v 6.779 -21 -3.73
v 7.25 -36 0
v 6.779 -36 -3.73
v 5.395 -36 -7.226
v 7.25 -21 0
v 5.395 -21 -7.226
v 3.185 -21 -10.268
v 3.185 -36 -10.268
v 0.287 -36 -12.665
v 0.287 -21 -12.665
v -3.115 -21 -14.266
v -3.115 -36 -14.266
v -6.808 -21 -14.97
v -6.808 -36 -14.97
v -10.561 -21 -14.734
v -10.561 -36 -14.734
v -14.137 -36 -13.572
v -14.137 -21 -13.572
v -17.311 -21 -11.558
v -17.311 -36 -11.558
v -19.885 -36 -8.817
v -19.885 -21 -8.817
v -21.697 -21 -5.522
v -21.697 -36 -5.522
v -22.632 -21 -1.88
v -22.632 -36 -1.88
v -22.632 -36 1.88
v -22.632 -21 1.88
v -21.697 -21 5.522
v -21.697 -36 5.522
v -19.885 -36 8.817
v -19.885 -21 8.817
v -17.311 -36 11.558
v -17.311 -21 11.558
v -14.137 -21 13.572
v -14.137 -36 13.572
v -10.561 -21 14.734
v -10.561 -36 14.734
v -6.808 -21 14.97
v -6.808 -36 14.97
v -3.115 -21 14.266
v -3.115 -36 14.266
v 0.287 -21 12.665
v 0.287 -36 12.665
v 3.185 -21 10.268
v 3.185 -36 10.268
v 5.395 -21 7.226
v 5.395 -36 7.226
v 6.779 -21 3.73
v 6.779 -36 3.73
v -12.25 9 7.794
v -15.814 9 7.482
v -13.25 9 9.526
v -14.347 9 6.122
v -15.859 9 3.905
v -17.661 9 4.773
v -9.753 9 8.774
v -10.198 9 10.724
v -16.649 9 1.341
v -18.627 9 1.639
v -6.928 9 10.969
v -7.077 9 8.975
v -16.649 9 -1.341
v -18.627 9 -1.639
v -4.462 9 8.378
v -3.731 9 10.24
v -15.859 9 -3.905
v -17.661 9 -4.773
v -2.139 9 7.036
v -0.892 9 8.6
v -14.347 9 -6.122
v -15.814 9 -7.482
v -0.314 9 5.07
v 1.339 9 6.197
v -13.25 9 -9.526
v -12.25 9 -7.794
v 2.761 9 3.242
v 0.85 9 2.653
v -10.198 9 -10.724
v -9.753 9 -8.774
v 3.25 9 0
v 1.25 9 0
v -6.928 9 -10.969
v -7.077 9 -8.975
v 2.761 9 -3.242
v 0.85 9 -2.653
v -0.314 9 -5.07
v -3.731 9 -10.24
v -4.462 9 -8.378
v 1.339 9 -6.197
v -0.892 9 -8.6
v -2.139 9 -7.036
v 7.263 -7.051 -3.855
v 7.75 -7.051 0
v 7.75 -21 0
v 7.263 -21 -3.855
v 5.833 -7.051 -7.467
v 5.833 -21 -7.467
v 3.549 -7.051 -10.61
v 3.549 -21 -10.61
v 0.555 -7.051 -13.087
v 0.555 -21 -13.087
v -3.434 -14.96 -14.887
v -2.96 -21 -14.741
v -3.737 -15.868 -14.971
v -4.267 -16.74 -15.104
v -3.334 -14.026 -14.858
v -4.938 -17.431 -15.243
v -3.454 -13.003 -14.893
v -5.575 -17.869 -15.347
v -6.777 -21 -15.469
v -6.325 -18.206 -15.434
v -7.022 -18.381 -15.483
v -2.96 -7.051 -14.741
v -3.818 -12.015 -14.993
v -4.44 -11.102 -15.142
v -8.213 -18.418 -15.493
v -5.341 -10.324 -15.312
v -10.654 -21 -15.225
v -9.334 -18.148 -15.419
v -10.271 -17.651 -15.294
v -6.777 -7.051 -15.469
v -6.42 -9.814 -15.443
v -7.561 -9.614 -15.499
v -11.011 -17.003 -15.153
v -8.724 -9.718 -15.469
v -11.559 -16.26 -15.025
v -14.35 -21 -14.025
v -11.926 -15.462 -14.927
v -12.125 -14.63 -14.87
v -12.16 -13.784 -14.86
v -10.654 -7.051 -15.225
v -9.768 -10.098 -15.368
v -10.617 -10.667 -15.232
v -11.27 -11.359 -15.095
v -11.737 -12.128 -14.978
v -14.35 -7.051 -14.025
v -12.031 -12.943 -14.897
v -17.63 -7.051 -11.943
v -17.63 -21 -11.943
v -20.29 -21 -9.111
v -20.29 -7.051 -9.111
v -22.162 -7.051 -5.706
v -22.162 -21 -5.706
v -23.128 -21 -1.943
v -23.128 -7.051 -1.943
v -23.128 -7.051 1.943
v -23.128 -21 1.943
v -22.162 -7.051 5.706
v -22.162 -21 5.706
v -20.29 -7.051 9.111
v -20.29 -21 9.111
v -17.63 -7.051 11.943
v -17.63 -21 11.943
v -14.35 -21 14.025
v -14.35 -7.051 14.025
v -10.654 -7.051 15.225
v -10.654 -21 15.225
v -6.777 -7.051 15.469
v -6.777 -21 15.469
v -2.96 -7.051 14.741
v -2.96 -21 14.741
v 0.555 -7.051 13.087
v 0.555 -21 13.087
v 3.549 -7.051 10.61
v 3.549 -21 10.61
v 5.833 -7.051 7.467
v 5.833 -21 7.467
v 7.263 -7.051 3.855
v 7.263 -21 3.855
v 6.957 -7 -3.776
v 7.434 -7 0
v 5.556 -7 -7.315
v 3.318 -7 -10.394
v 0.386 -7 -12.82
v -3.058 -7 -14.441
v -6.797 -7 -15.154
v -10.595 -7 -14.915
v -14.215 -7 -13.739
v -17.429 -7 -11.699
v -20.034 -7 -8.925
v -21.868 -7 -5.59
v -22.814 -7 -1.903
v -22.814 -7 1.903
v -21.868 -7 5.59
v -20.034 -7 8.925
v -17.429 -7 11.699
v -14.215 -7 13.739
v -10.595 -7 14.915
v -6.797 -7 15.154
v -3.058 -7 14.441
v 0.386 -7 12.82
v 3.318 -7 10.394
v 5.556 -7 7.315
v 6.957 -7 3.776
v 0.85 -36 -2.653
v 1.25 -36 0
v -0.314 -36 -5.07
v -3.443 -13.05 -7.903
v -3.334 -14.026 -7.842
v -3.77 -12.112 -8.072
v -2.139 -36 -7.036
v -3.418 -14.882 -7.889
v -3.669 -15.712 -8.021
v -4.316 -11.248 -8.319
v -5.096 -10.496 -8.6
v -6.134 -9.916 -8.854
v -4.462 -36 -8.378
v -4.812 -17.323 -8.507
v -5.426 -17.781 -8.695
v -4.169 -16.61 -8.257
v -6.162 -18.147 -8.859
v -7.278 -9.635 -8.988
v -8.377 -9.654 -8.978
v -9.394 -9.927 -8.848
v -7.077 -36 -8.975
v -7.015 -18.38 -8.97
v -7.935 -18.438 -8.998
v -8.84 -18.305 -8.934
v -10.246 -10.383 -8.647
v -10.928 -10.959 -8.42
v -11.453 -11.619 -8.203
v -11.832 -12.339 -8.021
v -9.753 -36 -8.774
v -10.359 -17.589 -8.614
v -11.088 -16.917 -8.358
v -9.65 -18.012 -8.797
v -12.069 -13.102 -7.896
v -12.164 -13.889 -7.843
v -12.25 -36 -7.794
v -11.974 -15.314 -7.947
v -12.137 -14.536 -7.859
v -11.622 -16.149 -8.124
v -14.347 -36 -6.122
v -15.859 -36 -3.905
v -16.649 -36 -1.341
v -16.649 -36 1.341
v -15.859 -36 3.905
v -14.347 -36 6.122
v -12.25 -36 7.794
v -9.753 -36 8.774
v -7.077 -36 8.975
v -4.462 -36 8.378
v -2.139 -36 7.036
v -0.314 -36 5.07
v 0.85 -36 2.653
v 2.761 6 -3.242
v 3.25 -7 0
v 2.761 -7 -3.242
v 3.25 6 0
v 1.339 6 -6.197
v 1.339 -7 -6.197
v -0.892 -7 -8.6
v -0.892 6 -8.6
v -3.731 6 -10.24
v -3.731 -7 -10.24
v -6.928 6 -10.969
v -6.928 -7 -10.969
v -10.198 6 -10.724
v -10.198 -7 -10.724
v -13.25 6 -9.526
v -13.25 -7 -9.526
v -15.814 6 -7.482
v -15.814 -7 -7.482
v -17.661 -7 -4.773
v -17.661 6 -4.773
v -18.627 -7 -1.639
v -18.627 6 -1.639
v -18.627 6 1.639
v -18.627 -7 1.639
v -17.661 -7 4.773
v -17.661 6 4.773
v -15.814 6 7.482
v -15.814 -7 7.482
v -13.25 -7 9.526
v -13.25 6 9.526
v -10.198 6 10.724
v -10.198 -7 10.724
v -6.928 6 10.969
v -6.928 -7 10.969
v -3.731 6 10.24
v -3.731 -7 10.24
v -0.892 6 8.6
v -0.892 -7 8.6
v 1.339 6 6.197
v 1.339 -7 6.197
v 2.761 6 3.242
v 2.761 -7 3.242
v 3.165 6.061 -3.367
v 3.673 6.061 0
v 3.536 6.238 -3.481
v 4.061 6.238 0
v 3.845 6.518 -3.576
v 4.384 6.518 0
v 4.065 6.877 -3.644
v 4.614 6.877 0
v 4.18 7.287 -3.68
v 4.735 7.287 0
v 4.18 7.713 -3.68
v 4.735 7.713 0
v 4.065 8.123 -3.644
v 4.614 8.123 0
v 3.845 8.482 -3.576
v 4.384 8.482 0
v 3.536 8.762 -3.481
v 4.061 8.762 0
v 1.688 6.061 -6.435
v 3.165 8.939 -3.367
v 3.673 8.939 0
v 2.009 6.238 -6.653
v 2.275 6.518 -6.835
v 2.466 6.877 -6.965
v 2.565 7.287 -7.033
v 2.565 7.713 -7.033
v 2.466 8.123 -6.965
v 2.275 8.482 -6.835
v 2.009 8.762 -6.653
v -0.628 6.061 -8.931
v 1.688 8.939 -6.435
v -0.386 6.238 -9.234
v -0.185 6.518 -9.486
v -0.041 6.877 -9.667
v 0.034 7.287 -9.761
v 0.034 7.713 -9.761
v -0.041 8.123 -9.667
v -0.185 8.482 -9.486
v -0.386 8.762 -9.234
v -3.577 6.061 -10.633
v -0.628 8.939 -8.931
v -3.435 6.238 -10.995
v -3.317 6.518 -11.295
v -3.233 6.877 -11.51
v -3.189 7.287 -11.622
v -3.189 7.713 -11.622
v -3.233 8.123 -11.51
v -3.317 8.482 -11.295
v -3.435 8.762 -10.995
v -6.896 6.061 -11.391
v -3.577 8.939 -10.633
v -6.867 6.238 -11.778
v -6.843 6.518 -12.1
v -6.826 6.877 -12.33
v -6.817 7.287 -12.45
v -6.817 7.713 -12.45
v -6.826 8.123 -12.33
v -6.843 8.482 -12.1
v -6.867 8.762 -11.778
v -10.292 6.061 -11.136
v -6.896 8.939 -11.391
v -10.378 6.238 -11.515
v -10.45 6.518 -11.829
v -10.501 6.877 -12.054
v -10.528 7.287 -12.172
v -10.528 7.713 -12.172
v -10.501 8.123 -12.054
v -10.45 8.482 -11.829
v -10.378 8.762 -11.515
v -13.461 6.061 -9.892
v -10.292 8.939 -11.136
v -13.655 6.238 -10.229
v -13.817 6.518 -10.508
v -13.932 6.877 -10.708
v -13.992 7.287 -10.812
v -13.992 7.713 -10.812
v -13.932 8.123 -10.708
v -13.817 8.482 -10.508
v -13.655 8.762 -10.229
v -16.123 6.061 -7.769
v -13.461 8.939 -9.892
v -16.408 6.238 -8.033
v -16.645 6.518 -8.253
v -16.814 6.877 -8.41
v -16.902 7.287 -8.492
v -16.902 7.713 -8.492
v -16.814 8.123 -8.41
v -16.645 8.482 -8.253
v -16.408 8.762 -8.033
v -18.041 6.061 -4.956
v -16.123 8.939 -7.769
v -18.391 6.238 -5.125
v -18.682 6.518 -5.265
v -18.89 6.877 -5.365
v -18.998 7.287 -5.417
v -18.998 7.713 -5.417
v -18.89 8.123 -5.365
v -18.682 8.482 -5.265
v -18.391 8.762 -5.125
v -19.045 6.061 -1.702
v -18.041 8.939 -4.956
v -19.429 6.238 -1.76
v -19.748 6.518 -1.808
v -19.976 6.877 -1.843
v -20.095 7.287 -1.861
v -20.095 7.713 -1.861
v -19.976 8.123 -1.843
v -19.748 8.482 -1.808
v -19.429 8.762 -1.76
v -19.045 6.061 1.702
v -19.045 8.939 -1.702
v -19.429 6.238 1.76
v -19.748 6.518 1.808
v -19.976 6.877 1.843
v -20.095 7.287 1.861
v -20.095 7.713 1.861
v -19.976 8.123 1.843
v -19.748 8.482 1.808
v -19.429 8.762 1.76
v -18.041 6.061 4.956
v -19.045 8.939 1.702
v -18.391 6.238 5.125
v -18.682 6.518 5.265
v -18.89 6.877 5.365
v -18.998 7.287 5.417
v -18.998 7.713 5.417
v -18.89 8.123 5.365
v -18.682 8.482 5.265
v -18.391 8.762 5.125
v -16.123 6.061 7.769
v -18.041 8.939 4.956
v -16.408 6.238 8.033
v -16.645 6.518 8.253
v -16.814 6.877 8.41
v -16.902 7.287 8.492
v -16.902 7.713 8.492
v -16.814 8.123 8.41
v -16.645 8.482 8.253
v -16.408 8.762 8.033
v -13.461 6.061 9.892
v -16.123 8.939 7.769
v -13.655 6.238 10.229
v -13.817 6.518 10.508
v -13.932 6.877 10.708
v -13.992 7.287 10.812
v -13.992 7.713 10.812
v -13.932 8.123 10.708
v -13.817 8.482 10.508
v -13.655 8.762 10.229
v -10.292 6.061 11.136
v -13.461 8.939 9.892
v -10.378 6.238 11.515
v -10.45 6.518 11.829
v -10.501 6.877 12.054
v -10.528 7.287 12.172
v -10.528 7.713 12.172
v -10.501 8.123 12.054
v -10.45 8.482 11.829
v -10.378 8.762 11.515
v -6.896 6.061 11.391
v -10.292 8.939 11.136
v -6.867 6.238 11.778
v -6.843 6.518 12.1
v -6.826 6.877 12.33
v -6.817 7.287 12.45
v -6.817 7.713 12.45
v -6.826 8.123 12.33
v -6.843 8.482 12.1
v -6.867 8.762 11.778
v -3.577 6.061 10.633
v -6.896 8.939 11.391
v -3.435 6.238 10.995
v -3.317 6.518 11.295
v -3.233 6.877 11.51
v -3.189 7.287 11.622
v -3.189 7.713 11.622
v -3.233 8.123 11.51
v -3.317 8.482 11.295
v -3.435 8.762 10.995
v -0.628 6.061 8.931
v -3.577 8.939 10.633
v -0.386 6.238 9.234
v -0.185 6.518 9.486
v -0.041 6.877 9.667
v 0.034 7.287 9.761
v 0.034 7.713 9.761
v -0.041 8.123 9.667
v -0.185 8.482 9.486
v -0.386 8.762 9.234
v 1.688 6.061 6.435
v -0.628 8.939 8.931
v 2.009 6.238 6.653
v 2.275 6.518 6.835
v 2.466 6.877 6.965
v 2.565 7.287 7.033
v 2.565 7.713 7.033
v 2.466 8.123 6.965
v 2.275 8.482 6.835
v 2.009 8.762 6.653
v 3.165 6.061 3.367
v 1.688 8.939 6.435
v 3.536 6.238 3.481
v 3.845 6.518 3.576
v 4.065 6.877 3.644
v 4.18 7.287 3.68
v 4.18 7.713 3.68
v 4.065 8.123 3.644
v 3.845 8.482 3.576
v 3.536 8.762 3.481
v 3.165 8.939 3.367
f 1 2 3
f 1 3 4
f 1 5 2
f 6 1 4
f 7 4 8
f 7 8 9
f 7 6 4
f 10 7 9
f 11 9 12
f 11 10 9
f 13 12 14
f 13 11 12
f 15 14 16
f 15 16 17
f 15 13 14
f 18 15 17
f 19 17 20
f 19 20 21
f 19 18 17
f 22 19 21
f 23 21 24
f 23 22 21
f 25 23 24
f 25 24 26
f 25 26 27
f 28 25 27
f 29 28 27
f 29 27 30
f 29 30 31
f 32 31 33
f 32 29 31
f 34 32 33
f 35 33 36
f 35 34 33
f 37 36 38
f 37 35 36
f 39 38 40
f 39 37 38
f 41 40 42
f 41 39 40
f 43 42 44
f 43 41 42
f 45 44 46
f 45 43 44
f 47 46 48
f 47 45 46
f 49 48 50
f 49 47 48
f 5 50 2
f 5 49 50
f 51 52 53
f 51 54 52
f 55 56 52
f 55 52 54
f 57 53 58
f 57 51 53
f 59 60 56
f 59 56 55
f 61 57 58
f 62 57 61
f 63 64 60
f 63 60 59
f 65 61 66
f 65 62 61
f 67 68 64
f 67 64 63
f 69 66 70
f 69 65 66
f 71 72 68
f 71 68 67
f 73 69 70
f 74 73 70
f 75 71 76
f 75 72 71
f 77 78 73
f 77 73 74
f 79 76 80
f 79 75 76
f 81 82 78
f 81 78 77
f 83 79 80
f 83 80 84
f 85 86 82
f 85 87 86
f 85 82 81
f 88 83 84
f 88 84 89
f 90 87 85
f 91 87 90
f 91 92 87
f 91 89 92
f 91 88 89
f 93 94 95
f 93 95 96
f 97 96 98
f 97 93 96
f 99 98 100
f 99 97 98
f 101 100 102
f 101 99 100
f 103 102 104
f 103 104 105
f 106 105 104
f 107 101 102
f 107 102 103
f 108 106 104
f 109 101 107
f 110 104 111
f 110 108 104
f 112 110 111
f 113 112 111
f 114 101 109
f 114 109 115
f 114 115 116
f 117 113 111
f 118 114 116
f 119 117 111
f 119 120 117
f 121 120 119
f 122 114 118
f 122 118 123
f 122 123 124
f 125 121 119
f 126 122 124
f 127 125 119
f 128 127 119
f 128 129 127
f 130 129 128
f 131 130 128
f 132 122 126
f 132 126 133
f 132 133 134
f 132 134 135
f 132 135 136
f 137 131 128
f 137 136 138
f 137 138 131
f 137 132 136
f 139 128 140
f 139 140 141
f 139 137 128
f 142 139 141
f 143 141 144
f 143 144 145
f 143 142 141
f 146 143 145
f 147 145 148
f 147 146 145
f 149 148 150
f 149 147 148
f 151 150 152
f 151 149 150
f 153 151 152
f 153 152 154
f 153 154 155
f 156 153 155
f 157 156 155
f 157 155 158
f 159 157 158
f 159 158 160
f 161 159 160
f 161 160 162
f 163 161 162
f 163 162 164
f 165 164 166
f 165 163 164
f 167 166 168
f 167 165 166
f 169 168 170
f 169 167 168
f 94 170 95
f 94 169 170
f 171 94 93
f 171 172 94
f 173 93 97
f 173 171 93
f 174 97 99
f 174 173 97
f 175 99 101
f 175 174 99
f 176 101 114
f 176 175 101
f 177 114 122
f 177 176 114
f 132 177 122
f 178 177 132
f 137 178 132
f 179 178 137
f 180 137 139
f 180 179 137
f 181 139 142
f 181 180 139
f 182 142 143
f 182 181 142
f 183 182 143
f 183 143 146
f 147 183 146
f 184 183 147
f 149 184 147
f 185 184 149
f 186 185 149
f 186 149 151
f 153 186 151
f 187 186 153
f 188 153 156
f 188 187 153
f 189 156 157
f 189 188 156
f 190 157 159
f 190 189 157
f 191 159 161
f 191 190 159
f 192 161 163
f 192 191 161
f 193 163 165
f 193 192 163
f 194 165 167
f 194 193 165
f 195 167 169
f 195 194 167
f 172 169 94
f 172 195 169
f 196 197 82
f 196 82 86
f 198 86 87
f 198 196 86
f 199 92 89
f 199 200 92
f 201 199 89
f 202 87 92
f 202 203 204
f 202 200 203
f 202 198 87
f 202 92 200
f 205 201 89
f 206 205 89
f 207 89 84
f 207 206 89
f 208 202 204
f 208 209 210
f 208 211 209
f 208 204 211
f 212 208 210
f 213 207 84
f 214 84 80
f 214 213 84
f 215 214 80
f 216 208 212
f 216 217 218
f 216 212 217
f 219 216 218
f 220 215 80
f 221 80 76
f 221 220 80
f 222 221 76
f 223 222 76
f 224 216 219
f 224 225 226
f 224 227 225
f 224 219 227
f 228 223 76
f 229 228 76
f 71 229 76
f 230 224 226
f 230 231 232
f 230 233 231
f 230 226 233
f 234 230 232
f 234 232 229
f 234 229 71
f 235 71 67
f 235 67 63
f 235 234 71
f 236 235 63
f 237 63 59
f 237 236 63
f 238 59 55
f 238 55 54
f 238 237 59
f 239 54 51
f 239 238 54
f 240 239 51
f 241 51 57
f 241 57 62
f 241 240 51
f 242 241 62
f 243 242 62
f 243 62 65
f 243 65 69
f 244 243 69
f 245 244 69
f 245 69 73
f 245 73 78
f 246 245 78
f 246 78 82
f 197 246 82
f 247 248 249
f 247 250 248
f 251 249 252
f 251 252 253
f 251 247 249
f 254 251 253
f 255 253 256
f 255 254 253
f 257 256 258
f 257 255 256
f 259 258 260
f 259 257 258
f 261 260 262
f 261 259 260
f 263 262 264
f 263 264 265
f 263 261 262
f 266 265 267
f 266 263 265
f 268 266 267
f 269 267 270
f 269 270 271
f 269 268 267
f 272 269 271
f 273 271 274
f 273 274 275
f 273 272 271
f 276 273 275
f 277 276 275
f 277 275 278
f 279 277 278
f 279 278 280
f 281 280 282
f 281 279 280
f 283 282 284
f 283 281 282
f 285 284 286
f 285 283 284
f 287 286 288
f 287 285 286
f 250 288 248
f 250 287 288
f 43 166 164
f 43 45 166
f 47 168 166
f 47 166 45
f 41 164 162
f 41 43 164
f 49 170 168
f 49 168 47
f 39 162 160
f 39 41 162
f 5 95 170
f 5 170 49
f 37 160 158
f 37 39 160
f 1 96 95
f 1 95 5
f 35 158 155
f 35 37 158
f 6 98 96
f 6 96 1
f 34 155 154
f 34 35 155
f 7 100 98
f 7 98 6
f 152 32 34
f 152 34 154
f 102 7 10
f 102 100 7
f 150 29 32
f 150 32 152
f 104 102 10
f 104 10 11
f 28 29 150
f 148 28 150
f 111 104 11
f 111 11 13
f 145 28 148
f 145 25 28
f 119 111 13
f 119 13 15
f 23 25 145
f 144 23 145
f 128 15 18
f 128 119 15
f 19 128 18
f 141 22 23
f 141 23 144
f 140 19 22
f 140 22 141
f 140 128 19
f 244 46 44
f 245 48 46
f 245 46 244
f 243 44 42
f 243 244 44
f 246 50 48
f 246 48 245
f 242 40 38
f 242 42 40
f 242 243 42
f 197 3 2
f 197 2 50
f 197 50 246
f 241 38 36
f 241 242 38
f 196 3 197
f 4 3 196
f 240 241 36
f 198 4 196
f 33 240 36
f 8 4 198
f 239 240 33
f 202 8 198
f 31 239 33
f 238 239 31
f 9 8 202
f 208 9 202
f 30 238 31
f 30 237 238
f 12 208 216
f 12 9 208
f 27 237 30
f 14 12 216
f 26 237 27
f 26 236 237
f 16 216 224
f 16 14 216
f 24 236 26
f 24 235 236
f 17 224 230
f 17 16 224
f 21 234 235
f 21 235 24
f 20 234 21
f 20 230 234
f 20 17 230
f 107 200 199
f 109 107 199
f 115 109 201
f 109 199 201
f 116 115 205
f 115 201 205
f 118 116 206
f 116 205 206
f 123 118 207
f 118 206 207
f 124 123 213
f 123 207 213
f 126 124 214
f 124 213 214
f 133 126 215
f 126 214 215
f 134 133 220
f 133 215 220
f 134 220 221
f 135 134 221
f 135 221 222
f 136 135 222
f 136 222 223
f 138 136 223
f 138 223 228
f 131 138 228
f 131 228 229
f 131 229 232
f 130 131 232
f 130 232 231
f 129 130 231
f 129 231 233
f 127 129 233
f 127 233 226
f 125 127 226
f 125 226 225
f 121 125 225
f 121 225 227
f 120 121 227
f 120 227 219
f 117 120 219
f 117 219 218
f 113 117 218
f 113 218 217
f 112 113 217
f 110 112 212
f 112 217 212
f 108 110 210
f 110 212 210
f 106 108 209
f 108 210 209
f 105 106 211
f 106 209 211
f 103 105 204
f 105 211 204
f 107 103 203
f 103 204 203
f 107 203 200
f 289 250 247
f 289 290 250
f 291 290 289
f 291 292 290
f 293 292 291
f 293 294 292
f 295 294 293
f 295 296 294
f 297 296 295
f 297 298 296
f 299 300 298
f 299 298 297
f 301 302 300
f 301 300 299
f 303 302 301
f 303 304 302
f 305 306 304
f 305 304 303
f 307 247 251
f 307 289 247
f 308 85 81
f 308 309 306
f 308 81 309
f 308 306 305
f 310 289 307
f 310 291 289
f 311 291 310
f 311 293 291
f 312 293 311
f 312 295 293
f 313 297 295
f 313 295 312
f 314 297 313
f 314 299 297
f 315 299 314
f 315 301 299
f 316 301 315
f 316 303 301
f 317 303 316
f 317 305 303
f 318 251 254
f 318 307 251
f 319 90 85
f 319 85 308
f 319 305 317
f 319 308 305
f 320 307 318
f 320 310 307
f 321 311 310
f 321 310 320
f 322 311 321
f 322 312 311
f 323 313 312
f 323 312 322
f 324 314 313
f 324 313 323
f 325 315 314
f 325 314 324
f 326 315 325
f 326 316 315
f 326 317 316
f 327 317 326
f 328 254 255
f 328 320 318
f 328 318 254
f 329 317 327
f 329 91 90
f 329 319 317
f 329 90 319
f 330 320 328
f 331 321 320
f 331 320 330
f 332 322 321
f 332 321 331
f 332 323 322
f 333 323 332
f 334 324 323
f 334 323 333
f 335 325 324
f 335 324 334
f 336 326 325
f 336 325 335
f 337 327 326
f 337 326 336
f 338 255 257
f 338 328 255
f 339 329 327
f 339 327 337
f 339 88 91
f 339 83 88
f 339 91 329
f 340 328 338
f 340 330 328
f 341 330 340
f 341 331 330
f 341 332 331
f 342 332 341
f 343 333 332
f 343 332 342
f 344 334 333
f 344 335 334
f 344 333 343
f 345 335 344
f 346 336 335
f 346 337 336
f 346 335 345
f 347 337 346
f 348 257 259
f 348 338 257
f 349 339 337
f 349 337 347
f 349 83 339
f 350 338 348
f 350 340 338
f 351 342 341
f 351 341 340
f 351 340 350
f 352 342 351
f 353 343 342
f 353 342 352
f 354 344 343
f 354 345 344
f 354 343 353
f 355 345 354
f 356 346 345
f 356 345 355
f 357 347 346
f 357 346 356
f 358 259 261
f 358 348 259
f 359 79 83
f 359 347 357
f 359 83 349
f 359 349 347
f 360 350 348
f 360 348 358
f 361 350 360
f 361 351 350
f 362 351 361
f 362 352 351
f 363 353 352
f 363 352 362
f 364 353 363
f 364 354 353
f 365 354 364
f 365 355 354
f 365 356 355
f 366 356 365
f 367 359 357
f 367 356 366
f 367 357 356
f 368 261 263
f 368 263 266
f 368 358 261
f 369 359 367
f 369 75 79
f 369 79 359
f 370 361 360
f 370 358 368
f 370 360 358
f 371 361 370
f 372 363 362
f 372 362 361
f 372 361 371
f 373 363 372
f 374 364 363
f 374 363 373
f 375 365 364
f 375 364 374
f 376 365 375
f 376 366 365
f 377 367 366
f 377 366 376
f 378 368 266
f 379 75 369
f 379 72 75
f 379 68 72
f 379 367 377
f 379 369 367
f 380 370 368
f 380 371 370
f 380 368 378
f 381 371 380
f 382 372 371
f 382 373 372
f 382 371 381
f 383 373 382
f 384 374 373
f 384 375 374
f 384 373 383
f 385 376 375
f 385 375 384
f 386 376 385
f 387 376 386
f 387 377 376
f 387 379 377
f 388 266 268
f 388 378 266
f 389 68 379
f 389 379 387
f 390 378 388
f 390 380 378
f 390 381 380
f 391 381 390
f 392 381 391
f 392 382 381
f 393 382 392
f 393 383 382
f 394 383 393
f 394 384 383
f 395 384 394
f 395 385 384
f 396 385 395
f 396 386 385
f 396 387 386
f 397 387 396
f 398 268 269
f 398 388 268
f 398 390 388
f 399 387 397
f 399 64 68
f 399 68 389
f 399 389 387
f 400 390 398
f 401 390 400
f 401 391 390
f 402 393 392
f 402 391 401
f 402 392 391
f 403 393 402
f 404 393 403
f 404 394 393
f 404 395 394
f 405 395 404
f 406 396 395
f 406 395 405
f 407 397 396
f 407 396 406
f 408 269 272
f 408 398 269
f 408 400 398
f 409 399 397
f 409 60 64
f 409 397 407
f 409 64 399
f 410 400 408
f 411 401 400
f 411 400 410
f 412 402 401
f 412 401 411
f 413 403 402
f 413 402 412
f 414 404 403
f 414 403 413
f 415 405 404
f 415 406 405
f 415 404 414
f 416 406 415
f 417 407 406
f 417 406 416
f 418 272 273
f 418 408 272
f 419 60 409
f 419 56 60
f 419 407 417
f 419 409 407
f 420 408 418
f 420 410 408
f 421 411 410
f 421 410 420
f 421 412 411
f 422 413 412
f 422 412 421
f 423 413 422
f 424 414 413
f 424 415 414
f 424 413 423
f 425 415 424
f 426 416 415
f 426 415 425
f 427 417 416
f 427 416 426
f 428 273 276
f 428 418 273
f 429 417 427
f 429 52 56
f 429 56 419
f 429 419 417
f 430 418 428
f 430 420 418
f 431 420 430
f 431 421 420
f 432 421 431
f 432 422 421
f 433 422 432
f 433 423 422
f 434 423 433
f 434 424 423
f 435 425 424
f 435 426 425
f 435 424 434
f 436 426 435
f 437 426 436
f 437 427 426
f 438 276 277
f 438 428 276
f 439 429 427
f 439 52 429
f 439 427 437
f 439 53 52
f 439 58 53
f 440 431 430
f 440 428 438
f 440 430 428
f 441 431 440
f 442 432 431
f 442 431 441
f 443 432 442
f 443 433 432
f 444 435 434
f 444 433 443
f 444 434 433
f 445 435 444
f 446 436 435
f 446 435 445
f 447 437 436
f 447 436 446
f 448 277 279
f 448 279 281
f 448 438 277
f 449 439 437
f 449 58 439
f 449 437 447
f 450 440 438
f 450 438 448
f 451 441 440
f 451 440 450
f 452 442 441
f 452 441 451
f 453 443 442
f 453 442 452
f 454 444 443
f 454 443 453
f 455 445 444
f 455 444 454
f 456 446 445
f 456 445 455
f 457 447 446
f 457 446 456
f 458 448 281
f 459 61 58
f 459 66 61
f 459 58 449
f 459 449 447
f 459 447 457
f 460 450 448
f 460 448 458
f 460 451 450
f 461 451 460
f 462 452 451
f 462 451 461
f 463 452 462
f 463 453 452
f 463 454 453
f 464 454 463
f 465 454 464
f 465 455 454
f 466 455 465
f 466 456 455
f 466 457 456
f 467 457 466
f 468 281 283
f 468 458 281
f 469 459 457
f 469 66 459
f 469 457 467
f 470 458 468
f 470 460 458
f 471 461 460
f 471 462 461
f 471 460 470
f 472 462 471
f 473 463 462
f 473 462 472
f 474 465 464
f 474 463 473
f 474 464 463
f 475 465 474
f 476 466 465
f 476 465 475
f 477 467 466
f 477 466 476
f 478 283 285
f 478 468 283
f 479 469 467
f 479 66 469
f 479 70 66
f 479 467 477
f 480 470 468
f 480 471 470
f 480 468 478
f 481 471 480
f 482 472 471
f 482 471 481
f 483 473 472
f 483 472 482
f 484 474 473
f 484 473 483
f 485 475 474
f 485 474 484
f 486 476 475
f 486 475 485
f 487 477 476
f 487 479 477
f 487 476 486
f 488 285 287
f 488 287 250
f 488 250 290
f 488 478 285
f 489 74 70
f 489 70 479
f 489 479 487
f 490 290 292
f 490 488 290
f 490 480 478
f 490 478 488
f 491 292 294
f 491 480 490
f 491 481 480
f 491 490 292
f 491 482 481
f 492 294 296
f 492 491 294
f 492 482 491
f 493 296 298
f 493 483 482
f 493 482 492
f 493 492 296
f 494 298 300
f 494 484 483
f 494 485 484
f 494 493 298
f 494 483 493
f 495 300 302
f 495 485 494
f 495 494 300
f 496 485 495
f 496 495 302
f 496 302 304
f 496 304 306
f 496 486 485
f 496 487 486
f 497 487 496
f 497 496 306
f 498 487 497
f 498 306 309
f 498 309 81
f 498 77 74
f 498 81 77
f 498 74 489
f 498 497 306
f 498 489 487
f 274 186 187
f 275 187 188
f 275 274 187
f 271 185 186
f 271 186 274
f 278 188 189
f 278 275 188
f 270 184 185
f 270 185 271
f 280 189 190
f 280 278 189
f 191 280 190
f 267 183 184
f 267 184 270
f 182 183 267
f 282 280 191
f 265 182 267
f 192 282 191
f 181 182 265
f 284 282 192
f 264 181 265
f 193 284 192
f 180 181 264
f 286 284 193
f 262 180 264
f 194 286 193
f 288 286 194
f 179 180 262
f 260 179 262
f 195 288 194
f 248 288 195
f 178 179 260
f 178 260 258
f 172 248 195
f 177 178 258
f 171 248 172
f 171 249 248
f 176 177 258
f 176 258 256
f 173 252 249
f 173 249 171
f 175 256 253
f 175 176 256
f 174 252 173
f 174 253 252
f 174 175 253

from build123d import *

# Parameters (mm, degrees)
CROQUIS1_W            = 6
CROQUIS1_H            = 15
CROQUIS2_R            = 4.41619294
CORTAR_EXTRUIR1_DEPTH = 46.572058325


with BuildPart() as part:
    # Croquis1 → Revolución1 (revolve)
    with BuildSketch(Plane.XY):
        with BuildLine():
            Line((7.75, -7.051316702), (7.433772234, -7))
            Line((7.433772234, -7), (3.25, -7))
            Line((3.25, -7), (3.25, 6))
            ThreePointArc((3.25, 6), (4.75, 7.5), (3.25, 9))
            Line((3.25, 9), (1.25, 9))
            Line((1.25, 9), (1.25, -9))
            Line((1.25, -9), (4.765255872, -9))
            Line((4.765255872, -9), (7.75, -9))
            Line((7.75, -9), (7.75, -7.051316702))
        make_face()
        Polygon((7.75, -21), (7.75, -9), (4.765255872, -9), (1.25, -9), (1.25, -21), (7.25, -21), align=None)
        with Locations((4.25, -28.5)):
            Rectangle(CROQUIS1_W, CROQUIS1_H)
    revolve(axis=Axis((-7.75, -7, 0), (0, 1, 0)))

    # Croquis2 → Cortar-Extruir1 (cut, through all)
    with BuildSketch(Plane.XY):
        with Locations((-7.75, -14.025658351)):
            Circle(CROQUIS2_R)
    extrude(amount=-CORTAR_EXTRUIR1_DEPTH, mode=Mode.SUBTRACT)


solid = part.part
